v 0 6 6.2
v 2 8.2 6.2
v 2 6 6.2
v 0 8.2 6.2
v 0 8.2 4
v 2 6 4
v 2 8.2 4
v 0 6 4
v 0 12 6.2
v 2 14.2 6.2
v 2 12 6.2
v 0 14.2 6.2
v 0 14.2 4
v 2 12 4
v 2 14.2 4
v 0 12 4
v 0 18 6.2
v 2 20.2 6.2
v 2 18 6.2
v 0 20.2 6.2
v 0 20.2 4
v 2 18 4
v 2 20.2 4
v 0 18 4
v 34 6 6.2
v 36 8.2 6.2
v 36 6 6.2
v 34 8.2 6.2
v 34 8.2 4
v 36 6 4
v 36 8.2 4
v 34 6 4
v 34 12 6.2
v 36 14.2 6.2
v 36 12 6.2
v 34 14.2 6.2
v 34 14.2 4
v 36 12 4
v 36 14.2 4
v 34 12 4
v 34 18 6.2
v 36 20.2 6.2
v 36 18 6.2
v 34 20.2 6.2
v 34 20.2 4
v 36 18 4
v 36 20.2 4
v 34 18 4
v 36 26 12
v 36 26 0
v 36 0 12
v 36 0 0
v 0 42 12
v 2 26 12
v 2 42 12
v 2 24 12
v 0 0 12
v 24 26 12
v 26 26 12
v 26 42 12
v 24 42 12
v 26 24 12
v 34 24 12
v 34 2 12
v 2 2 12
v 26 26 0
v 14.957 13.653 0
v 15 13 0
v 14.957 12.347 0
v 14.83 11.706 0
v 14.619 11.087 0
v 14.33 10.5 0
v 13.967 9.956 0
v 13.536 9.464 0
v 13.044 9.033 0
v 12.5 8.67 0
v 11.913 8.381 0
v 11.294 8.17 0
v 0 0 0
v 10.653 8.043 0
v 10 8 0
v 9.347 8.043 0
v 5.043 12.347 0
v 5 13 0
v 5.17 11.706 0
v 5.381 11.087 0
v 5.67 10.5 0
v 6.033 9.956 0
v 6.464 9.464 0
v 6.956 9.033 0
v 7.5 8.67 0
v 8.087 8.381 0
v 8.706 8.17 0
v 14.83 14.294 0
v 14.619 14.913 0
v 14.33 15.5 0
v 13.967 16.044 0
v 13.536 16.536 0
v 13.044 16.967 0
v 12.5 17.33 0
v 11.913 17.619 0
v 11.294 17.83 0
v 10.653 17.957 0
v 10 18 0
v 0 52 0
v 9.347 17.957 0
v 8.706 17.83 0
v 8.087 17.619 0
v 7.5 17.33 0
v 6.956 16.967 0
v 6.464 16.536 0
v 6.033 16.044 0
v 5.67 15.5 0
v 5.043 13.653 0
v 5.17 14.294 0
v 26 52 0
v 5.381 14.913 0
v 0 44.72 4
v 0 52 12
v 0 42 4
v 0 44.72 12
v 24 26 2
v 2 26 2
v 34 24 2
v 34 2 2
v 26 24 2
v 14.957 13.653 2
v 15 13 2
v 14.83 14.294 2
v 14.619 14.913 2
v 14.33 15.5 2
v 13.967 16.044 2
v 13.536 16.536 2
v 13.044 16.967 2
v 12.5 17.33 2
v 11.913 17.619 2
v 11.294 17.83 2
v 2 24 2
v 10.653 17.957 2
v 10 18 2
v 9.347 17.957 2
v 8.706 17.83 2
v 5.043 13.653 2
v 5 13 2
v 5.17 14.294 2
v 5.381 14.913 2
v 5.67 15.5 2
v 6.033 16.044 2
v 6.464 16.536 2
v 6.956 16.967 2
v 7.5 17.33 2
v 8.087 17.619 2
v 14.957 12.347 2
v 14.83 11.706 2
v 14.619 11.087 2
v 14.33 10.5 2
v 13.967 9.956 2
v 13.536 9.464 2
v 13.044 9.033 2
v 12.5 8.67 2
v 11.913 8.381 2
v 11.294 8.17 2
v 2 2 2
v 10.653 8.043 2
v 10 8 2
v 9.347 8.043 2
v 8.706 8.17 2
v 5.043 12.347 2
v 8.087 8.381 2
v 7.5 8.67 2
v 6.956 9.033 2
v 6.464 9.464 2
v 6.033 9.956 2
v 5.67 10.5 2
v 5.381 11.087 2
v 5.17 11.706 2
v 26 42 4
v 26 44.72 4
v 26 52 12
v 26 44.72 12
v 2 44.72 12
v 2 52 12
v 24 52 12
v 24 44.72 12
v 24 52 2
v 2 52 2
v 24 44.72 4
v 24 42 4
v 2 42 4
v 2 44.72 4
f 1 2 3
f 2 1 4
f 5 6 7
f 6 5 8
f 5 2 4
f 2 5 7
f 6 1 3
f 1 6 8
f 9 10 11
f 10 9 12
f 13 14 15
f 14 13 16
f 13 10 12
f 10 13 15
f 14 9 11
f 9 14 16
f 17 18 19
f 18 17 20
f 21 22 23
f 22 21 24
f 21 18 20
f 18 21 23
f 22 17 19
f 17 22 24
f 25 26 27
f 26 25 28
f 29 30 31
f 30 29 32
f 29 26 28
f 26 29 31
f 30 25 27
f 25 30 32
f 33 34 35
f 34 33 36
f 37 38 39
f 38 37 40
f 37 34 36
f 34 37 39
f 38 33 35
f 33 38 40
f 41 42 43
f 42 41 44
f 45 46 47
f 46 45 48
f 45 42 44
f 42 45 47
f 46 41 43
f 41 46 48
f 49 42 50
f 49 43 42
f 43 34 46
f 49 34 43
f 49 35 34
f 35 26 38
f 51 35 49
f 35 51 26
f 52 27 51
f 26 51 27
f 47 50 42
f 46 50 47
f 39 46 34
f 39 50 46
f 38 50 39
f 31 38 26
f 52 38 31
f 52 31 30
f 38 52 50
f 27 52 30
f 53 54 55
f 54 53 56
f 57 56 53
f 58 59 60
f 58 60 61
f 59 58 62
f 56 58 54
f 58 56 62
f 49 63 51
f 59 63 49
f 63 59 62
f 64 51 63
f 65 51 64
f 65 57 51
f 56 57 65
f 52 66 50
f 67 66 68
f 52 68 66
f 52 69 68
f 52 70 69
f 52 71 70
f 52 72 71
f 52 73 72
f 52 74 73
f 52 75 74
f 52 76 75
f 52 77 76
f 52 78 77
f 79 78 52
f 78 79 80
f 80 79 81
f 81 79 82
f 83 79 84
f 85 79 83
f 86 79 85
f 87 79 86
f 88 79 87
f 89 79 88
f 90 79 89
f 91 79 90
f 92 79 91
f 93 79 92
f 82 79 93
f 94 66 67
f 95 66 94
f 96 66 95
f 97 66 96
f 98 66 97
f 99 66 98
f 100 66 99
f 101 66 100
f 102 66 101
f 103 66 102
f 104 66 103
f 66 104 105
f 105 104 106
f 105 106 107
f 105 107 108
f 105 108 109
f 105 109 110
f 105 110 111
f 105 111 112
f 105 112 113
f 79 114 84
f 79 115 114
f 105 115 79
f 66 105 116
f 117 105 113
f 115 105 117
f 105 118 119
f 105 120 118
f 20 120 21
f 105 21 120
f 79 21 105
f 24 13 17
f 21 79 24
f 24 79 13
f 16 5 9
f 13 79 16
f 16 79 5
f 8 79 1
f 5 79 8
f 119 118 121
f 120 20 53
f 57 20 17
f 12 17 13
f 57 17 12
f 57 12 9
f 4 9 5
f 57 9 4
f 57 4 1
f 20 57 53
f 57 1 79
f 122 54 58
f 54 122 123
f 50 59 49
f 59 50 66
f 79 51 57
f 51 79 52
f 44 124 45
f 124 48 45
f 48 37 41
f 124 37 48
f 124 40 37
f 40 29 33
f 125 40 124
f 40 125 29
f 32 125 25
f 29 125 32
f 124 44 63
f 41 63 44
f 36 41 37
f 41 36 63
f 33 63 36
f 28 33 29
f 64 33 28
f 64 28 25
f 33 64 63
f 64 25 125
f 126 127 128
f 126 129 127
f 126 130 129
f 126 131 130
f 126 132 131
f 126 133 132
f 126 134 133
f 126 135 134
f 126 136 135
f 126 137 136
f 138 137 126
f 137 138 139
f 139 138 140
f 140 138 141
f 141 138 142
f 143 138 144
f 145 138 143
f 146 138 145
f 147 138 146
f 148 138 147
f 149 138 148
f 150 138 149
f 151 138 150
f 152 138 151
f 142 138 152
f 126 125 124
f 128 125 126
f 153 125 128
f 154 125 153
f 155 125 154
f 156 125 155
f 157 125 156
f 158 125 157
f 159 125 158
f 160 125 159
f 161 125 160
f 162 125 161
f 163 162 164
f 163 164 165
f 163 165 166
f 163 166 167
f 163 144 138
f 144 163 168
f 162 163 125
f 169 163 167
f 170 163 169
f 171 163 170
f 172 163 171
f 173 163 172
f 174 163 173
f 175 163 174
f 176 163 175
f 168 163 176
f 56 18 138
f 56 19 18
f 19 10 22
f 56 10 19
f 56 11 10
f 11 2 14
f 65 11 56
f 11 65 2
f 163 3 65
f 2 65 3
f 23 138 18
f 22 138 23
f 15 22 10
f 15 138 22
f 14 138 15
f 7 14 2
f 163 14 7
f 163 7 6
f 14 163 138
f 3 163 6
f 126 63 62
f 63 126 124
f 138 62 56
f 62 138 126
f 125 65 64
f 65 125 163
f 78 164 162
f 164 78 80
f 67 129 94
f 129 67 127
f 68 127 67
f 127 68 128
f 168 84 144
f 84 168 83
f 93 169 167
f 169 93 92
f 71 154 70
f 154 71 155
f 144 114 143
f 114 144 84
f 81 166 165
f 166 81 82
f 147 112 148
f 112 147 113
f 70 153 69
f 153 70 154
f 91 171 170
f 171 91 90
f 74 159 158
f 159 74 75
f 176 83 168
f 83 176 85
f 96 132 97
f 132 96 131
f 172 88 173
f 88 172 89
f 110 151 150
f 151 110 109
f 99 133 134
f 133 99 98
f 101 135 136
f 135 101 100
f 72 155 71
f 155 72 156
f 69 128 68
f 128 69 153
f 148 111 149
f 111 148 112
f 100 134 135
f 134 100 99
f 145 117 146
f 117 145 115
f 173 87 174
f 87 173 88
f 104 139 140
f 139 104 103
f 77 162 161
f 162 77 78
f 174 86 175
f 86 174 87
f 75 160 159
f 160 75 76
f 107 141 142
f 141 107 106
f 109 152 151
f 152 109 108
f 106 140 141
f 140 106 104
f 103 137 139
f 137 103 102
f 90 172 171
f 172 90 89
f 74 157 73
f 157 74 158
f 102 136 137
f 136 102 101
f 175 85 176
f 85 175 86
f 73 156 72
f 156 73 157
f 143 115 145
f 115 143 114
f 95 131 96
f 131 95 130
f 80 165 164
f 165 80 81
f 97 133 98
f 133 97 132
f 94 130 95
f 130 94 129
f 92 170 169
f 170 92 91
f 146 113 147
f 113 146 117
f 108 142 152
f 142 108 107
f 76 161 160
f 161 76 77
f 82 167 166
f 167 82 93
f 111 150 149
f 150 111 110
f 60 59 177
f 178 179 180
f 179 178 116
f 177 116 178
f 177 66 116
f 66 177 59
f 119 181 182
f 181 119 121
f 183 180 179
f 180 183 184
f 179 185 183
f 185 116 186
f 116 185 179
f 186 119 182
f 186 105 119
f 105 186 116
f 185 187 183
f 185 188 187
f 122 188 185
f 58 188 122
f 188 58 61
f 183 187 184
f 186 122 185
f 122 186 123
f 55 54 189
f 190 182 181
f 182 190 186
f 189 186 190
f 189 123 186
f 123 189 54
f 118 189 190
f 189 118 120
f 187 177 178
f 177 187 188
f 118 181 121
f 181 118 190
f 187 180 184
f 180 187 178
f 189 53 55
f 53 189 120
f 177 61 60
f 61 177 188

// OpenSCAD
// FridgeSnap door-bin clip
// Print in PETG. Measure your bin lip, then edit BIN_THICKNESS.
// Clip opening is slightly undersized so it grips.

BIN_THICKNESS = 3.2;   // mm — measure the door-shelf front lip
BIN_DEPTH     = 18;    // how far the clip hooks inward
BOARD_L       = 32;    // XIAO ESP32S3 Sense-ish footprint
BOARD_W       = 22;
BOARD_H       = 10;
WALL          = 2.0;
LENS_D        = 10;
VENT          = 2.2;

$fn = 48;

module clip_arm() {
  difference() {
    cube([BOARD_W + 2*WALL, BIN_DEPTH + WALL + 8, 12]);
    translate([WALL, WALL, WALL])
      cube([BOARD_W, BIN_DEPTH + 10, 12]);
    // squeeze slot
    translate([-1, BIN_DEPTH, 4])
      cube([BOARD_W + 2*WALL + 2, BIN_THICKNESS * 0.85, 8]);
  }
}

module camera_pocket() {
  difference() {
    cube([BOARD_L + 2*WALL, BOARD_W + 2*WALL, BOARD_H + WALL]);
    translate([WALL, WALL, WALL])
      cube([BOARD_L, BOARD_W, BOARD_H + 1]);
    // lens
    translate([WALL + 8, (BOARD_W + 2*WALL)/2, -1])
      cylinder(h = WALL + 2, d = LENS_D);
    // vents (sides) — do not seal this box
    for (y = [6, 12, 18])
      translate([-1, y, 4]) cube([WALL + 2, VENT, VENT]);
    for (y = [6, 12, 18])
      translate([BOARD_L + WALL - 1, y, 4]) cube([WALL + 2, VENT, VENT]);
  }
}

union() {
  camera_pocket();
  translate([0, BOARD_W + WALL, 0]) clip_arm();
}
